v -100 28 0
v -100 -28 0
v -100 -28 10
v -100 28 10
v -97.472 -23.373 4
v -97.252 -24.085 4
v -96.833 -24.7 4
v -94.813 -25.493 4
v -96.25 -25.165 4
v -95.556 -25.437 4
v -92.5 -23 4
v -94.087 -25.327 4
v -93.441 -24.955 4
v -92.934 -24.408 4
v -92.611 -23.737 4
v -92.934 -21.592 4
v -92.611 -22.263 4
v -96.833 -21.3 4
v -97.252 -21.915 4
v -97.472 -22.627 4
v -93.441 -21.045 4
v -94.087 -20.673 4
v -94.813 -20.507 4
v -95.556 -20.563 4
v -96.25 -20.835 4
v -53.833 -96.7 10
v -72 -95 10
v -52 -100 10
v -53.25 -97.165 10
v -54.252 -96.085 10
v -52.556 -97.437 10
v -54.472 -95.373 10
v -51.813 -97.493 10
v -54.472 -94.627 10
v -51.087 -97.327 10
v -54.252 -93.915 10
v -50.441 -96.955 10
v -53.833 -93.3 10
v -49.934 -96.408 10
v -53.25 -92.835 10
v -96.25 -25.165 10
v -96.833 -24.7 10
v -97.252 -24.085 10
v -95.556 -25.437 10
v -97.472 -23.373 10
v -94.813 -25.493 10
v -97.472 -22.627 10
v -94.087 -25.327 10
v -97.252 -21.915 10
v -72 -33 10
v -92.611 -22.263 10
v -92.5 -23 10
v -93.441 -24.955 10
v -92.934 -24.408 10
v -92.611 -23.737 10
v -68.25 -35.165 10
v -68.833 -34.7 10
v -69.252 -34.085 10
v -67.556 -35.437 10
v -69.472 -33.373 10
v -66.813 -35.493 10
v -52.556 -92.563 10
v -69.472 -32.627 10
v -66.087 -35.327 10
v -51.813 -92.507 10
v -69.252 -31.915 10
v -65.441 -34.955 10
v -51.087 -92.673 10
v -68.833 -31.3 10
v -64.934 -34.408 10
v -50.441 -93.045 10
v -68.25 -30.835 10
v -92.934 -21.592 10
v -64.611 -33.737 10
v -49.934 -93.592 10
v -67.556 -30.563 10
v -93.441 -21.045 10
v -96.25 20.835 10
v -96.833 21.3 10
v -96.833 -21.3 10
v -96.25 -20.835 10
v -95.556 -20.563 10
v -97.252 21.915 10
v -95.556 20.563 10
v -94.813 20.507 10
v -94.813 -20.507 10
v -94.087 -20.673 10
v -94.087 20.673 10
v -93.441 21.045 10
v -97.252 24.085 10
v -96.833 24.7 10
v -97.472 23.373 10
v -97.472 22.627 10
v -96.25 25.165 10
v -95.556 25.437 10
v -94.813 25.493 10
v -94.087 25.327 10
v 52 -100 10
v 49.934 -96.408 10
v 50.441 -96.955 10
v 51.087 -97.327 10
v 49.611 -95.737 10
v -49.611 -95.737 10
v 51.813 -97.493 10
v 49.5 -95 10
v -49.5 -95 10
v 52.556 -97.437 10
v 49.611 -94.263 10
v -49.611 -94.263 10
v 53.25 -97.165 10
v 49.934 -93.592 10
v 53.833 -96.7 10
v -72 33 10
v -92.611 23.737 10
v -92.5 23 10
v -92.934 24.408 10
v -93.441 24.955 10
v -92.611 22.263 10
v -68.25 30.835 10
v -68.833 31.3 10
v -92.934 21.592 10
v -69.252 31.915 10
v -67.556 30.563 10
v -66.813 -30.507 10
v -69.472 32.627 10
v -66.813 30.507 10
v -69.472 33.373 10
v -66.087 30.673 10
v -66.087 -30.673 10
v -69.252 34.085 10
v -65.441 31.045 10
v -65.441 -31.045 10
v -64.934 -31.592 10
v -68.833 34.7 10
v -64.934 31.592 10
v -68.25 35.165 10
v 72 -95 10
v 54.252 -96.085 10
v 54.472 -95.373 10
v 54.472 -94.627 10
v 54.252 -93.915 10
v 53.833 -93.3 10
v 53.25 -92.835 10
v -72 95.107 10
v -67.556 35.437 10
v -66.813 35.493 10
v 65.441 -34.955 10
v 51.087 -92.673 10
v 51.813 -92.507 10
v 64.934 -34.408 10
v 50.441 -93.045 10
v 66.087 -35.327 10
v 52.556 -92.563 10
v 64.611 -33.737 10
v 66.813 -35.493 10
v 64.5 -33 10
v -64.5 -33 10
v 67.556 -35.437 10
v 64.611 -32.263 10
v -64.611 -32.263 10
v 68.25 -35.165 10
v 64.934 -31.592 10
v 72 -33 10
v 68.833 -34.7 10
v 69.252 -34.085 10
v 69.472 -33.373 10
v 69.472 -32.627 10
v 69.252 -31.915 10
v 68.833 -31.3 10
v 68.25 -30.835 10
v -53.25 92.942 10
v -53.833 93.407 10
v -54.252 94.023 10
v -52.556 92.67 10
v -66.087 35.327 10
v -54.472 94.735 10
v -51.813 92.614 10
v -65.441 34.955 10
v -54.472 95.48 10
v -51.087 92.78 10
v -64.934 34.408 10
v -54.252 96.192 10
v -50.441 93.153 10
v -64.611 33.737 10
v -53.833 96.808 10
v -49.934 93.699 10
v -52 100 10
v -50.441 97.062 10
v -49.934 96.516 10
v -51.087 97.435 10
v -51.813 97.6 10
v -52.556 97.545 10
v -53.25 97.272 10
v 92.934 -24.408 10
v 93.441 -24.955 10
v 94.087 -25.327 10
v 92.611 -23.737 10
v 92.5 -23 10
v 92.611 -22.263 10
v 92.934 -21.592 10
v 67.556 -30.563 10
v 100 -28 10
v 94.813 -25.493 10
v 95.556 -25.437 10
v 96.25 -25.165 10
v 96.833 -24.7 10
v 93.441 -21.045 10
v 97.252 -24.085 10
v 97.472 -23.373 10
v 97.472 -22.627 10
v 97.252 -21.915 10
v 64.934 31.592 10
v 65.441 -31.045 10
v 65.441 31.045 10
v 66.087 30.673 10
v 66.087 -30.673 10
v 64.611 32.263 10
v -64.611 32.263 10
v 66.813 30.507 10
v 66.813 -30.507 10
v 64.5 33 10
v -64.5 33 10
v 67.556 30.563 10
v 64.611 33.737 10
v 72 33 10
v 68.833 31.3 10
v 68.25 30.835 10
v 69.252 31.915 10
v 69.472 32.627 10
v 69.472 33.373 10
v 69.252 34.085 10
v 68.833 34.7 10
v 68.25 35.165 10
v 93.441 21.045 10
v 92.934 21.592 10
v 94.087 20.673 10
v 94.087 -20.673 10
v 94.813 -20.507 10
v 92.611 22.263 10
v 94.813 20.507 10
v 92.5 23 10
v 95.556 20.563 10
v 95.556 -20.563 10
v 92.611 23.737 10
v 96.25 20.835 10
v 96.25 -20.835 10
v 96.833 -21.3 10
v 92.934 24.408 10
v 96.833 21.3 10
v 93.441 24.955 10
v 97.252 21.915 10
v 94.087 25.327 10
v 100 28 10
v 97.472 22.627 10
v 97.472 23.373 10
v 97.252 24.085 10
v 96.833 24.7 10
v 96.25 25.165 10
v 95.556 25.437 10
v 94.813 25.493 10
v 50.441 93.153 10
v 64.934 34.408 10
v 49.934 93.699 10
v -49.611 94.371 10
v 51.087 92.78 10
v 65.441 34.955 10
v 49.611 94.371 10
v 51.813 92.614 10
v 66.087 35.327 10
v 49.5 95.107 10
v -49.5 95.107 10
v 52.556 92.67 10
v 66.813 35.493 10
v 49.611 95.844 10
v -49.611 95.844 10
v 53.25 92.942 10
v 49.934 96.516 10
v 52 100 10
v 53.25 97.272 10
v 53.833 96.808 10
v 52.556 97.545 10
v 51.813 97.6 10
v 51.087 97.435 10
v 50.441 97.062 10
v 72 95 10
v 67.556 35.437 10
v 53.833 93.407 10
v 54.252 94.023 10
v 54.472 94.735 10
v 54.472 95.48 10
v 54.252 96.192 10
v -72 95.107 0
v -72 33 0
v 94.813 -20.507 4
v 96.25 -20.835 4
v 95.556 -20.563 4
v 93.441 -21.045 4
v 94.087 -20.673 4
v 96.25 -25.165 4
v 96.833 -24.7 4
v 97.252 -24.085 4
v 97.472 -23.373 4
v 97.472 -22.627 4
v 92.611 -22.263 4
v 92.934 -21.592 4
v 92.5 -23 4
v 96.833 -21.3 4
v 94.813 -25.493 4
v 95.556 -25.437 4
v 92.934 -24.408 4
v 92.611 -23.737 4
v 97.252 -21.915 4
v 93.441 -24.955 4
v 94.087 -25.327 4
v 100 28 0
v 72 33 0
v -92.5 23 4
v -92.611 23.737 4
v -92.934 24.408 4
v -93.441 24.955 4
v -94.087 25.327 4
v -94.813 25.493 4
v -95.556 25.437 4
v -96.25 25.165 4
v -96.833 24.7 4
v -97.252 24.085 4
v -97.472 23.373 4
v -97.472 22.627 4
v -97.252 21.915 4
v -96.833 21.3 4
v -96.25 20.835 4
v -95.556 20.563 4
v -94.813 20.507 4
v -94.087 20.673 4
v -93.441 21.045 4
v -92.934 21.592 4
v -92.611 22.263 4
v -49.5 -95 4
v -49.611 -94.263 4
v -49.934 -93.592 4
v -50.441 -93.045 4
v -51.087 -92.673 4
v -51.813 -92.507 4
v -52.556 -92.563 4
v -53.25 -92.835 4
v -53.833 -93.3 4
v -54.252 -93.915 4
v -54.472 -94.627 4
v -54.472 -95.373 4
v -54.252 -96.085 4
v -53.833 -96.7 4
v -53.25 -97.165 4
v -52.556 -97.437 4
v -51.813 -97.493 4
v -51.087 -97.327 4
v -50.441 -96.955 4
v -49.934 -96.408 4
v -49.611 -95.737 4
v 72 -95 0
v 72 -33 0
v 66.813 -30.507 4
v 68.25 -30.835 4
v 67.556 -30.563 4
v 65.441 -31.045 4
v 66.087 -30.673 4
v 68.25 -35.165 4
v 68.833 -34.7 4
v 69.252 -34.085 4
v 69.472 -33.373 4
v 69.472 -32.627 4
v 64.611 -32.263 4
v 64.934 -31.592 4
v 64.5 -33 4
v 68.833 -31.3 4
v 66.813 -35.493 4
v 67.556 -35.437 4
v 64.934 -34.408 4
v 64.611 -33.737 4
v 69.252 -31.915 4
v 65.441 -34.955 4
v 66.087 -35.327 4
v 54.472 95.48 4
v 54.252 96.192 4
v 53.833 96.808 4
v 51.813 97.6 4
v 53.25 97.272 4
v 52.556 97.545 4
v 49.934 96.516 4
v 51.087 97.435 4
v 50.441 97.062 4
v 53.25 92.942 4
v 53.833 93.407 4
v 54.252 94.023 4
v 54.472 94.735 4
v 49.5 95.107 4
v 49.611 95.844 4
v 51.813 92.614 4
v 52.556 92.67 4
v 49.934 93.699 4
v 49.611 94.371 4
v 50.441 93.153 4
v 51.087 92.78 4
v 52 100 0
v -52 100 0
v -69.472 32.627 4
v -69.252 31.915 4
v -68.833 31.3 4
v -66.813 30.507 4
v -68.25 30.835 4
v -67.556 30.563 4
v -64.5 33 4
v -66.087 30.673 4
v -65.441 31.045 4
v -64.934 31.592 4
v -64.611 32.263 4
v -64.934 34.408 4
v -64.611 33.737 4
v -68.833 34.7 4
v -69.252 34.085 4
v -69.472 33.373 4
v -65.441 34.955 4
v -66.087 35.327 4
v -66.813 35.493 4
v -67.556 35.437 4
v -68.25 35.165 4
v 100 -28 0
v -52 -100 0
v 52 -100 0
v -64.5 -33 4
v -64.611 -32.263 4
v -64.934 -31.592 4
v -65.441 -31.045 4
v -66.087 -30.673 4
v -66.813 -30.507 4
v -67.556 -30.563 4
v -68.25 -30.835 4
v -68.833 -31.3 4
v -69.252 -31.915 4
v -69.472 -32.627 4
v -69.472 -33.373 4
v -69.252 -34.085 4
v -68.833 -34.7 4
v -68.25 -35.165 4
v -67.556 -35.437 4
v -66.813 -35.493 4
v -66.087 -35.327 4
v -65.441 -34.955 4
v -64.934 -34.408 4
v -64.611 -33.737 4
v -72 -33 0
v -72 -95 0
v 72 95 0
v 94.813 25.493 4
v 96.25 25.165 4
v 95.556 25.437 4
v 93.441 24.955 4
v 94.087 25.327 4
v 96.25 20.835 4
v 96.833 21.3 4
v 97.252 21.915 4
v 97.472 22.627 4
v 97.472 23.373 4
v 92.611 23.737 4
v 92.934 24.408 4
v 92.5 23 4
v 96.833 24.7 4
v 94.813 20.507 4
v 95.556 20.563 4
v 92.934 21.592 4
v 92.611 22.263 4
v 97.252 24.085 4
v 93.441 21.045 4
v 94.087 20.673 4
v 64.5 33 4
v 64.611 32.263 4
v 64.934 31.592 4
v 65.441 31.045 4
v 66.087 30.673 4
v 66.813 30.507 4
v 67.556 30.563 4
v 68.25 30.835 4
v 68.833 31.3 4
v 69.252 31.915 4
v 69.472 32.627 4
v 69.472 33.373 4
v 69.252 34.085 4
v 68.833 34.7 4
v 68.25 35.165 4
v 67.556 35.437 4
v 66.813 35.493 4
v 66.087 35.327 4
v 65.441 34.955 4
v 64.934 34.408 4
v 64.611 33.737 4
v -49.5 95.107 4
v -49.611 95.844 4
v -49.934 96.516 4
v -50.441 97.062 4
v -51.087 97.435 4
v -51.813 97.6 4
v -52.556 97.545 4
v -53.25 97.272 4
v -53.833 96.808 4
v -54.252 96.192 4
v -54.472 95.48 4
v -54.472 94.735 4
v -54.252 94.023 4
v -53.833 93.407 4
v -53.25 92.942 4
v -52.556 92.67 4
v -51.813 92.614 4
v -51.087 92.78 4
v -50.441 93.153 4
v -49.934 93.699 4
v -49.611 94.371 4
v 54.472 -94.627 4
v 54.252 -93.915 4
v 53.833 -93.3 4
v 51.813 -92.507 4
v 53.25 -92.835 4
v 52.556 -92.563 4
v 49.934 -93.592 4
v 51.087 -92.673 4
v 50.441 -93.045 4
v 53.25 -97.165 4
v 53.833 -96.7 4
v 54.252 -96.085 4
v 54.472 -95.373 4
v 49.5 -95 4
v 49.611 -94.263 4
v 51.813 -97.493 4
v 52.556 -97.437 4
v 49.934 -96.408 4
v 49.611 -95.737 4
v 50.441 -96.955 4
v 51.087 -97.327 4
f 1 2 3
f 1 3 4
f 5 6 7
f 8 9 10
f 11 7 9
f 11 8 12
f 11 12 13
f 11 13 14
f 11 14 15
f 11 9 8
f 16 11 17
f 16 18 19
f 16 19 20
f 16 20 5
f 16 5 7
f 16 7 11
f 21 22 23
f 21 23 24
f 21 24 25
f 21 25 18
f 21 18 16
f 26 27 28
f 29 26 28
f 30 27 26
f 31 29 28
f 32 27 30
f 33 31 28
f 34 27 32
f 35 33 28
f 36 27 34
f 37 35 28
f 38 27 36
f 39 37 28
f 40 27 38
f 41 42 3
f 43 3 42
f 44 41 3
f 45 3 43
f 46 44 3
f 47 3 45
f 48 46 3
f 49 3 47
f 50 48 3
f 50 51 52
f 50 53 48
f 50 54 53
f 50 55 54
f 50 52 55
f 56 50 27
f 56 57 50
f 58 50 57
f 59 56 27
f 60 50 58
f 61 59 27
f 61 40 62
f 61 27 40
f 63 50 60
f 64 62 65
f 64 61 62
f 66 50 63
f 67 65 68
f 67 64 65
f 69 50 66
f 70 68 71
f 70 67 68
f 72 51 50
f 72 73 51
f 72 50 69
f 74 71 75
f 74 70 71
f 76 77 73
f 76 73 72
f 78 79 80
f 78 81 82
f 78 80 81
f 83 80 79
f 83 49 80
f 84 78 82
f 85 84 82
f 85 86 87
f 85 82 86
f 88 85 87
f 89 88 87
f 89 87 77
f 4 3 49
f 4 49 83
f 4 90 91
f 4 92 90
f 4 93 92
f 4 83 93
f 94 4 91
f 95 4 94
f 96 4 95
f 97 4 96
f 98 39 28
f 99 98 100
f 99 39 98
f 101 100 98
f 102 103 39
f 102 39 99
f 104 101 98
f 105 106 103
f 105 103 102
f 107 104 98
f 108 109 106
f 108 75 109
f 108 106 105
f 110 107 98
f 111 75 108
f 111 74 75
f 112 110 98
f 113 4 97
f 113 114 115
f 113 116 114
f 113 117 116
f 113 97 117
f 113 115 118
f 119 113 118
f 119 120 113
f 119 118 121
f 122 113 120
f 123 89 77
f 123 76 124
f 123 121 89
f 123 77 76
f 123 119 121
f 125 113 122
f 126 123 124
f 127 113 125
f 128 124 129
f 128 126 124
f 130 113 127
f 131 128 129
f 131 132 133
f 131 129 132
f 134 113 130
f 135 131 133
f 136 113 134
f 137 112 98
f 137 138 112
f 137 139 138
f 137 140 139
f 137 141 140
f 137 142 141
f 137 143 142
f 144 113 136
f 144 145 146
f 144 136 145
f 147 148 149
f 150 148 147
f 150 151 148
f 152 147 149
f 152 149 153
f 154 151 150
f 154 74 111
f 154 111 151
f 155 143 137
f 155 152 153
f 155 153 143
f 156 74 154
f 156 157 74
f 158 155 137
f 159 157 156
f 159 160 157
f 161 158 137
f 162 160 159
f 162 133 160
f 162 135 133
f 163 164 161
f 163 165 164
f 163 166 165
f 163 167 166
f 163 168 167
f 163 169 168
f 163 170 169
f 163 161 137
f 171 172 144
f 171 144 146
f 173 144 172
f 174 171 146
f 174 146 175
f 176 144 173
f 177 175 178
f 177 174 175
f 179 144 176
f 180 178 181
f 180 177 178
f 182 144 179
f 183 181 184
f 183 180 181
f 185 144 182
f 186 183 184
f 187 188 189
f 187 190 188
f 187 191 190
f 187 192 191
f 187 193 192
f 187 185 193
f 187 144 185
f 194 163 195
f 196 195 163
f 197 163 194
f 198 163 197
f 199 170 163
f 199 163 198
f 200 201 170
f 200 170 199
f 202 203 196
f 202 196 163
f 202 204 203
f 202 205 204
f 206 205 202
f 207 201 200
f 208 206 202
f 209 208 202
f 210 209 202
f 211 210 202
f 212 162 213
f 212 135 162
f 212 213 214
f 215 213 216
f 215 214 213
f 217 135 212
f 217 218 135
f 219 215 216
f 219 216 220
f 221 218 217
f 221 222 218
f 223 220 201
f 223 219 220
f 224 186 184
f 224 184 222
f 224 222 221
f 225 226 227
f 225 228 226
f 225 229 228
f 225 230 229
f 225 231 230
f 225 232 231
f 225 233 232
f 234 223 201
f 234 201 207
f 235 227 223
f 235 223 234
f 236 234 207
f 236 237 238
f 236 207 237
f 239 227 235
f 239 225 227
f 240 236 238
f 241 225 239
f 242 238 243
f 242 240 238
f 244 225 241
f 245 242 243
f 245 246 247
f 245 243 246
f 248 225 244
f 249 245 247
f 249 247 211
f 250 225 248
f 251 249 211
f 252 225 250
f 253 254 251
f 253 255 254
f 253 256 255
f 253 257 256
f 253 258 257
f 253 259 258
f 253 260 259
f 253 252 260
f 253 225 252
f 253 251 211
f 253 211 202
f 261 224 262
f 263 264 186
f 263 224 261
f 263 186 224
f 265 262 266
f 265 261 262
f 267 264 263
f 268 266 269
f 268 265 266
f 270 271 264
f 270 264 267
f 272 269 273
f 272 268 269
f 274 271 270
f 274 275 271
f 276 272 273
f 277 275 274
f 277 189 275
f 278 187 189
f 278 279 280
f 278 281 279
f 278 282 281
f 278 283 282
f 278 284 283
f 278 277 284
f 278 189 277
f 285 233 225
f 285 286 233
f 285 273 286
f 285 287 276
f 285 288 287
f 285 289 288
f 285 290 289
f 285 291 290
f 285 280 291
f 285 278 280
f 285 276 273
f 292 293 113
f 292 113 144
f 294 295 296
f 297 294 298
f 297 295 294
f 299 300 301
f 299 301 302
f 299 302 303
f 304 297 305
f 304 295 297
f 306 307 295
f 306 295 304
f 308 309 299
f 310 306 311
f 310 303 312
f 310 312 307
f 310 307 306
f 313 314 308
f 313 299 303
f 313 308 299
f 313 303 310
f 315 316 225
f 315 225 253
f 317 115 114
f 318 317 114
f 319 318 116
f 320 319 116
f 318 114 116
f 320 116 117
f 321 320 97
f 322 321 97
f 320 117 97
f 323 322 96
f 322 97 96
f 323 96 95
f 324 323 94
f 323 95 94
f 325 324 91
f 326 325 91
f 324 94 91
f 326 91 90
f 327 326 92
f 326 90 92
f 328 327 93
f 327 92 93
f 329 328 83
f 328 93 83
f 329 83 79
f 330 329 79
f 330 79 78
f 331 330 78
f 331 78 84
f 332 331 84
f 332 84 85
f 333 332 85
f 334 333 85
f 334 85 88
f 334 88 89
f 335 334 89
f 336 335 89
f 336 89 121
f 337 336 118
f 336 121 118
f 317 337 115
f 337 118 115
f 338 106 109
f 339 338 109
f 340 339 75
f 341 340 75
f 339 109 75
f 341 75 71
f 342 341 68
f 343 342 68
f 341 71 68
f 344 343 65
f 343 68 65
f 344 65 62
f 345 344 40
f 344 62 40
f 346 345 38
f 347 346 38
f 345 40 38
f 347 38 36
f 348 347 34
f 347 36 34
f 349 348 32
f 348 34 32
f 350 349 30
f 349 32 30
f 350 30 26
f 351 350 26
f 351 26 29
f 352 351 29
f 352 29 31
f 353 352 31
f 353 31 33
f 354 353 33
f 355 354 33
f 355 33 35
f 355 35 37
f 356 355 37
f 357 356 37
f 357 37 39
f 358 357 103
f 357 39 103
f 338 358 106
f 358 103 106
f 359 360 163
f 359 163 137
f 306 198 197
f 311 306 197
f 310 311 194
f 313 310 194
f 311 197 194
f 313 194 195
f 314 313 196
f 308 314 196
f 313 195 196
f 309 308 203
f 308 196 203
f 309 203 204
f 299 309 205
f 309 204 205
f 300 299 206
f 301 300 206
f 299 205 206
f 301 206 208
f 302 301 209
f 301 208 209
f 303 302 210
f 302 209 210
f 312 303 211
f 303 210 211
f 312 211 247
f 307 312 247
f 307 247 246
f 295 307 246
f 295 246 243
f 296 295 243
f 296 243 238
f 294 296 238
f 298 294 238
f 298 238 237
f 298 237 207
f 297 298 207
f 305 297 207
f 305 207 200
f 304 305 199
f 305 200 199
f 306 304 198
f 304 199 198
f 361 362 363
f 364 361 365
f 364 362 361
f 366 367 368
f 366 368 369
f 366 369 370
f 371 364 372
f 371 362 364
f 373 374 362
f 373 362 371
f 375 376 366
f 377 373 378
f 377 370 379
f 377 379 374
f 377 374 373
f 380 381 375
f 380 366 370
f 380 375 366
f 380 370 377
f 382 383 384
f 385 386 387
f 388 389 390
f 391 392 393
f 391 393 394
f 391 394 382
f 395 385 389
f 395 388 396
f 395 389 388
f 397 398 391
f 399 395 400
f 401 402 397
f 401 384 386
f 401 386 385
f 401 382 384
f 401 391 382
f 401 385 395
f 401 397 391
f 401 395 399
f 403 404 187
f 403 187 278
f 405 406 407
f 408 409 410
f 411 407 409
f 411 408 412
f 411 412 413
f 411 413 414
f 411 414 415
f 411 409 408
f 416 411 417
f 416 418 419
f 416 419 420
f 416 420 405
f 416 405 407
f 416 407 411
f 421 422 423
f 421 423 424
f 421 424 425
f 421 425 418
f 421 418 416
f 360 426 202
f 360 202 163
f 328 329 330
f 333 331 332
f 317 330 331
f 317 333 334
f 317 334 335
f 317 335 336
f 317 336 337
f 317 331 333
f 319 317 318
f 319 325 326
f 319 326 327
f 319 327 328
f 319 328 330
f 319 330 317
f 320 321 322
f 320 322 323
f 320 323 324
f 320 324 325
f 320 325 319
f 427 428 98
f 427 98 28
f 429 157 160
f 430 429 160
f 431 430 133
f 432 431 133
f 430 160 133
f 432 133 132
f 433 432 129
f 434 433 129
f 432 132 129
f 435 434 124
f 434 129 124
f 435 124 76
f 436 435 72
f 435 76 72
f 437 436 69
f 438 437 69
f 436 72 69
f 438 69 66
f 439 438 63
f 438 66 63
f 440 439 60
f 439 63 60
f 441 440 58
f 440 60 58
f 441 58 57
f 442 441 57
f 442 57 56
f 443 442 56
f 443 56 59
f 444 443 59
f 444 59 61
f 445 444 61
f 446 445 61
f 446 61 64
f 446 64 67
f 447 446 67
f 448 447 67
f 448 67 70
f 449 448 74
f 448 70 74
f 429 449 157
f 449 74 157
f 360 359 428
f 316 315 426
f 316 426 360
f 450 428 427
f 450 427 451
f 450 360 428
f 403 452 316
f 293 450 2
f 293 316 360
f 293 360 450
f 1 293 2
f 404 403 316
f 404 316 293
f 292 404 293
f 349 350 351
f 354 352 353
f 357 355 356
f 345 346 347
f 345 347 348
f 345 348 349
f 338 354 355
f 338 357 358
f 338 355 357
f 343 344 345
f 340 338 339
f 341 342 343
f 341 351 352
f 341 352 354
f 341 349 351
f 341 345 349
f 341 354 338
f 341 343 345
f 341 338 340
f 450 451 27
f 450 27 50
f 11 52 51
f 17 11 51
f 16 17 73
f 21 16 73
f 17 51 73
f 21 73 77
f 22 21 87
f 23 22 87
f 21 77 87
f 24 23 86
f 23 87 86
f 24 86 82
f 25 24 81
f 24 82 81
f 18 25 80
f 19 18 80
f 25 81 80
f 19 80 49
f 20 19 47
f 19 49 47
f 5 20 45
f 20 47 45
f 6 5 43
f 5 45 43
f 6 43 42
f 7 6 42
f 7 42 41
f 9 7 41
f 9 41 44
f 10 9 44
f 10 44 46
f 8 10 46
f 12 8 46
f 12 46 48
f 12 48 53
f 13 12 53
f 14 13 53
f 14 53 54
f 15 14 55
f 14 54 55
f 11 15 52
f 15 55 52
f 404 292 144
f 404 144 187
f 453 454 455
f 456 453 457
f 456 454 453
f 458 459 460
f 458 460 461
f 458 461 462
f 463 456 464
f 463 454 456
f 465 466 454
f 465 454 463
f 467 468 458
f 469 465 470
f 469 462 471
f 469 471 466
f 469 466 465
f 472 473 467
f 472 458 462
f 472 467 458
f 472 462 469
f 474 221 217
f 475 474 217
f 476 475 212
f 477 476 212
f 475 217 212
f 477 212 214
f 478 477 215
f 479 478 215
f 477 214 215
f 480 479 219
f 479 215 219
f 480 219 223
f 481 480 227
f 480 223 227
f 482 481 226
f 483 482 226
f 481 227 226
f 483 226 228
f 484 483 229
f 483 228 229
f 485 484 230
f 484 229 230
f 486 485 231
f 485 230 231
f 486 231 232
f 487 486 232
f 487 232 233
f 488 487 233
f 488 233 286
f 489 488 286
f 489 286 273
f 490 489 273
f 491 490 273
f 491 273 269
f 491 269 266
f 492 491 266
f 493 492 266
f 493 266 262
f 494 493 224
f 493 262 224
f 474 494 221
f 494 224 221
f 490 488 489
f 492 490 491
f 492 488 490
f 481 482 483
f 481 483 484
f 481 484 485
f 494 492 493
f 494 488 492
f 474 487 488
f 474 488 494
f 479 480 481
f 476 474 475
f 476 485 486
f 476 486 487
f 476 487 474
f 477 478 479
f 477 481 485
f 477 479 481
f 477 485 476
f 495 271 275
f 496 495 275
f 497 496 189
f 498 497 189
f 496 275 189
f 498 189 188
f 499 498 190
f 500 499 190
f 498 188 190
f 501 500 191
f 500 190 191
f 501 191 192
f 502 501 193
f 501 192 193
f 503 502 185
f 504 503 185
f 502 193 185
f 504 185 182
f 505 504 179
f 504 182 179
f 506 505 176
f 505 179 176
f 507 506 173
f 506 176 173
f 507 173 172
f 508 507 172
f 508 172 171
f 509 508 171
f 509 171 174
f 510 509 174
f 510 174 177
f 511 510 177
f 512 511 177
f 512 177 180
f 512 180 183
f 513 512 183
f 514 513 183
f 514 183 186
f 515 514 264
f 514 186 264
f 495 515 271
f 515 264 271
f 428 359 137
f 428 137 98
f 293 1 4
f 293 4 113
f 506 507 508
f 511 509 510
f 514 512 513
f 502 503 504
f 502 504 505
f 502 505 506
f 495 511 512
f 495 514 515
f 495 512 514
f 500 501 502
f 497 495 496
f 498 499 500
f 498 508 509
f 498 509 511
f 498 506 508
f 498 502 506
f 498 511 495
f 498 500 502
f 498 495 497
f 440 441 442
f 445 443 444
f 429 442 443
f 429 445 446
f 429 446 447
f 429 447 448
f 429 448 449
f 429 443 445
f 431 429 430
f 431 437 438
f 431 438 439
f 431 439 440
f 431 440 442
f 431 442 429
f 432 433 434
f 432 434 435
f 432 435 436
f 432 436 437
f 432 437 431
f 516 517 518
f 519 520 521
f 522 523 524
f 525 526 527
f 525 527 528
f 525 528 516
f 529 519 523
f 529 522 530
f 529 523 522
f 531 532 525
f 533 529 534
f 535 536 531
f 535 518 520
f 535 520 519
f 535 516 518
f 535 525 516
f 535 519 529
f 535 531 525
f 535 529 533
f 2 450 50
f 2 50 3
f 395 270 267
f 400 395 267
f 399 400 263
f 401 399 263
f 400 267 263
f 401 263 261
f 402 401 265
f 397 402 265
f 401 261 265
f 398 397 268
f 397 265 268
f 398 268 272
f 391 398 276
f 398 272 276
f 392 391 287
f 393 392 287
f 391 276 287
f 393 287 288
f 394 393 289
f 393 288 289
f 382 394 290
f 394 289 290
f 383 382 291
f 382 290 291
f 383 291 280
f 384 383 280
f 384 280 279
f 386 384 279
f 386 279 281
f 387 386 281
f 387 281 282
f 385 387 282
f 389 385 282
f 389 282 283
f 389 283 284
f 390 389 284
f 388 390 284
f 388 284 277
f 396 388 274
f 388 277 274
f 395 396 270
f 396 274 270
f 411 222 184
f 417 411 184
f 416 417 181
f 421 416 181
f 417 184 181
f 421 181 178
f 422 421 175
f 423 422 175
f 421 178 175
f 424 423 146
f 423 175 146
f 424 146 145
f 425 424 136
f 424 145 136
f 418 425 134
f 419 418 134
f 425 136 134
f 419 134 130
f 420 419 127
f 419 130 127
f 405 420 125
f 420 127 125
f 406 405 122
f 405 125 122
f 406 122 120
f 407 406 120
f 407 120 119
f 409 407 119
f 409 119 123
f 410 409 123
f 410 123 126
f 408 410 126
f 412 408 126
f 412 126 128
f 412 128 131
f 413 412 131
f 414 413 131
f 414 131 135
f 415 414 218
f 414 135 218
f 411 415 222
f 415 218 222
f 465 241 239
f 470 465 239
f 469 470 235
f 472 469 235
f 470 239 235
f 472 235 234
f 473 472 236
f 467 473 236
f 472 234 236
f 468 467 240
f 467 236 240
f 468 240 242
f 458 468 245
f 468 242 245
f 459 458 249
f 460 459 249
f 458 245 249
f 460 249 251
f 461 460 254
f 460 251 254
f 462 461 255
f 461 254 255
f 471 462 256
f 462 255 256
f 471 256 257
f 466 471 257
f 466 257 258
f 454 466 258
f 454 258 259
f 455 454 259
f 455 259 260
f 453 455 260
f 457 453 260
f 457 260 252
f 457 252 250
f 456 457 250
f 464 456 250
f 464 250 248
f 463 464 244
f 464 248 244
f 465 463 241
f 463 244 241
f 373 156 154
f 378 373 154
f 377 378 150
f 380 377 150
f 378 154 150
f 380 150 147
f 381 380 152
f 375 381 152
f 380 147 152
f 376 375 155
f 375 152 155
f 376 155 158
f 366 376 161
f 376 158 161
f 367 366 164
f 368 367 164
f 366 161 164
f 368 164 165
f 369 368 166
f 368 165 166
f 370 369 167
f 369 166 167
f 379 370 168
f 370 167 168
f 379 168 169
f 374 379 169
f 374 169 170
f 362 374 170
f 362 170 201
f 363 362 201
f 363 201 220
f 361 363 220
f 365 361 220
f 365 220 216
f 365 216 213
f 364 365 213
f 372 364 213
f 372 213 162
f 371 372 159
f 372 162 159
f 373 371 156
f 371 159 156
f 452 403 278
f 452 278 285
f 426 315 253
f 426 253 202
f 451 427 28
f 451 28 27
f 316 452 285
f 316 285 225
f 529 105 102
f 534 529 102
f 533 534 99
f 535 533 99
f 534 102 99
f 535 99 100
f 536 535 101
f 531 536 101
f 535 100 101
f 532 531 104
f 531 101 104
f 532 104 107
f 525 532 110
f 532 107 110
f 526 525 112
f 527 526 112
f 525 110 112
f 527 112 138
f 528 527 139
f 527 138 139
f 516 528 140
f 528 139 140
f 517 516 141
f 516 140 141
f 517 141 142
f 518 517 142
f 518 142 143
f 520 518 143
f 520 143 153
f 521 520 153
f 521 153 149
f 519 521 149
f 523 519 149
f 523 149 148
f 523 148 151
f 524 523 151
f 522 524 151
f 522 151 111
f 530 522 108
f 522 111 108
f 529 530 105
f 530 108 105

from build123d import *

# Parameters (mm, degrees)
BOSS_EXTRUDE2_DEPTH = 15
SKETCH2_W           = 3
SKETCH2_H           = 20
CUT_EXTRUDE2_DEPTH  = 10
SKETCH4_W           = 3
SKETCH4_H           = 20
BOSS_EXTRUDE5_DEPTH = 10
CUT_EXTRUDE3_DEPTH  = 5
SKETCH6_R           = 2.5
CUT_EXTRUDE4_DEPTH  = 6


with BuildPart() as part:
    # Sketch1 → Boss-Extrude2 (new body)
    with BuildSketch(Plane.XY):
        Polygon((-52, 100), (52, 100), (72, 95), (72, 33), (100, 28), (100, -28), (72, -33), (72, -95), (52, -100), (-52, -100), (-72, -95), (-72, -33), (-100, -28), (-100, 28), (-72, 33), (-72, 95.107401563), align=None)
    extrude(amount=BOSS_EXTRUDE2_DEPTH)

    # Sketch2 → Cut-Extrude2 (cut)
    with BuildSketch(Plane.XY.offset(15)):
        with Locations((-69.5, 80.352031484)):
            Rectangle(SKETCH2_W, SKETCH2_H)
        with Locations((-69.5, 43)):
            Rectangle(SKETCH2_W, SKETCH2_H)
    extrude(amount=-CUT_EXTRUDE2_DEPTH, mode=Mode.SUBTRACT)

    # Sketch4 → Boss-Extrude5 (add)
    with BuildSketch(Plane.XY.offset(15)):
        Polygon((-71, 90.352031484), (-68, 90.352031484), (-68, 70.352031484), (-69.5, 70.352031484), (-71, 70.352031484), align=None)
        with Locations((-69.5, 43)):
            Rectangle(SKETCH4_W, SKETCH4_H)
    extrude(amount=-BOSS_EXTRUDE5_DEPTH)

    # Sketch5 → Cut-Extrude3 (cut)
    with BuildSketch(Plane.XY.offset(15)):
        Polygon((-72, 95.107401563), (-72, 33), (-100, 28), (-100, -28), (-72, -33), (-72, -95), (-52, -100), (52, -100), (72, -95), (72, -33), (100, -28), (100, 28), (72, 33), (72, 95), (52, 100), (-52, 100), align=None)
    extrude(amount=-CUT_EXTRUDE3_DEPTH, mode=Mode.SUBTRACT)

    # Sketch6 → Cut-Extrude4 (cut)
    with BuildSketch(Plane.XY.offset(10)):
        with Locations((-52, 95.107401563)):
            Circle(SKETCH6_R)
        with Locations((-52, -95)):
            Circle(SKETCH6_R)
        with Locations((-67, -33)):
            Circle(SKETCH6_R)
        with Locations((-67, 33)):
            Circle(SKETCH6_R)
        with Locations((-95, 23)):
            Circle(SKETCH6_R)
        with Locations((-95, -23)):
            Circle(SKETCH6_R)
        with Locations(Location((95, -23, 0), (0, 0, 180))):
            Circle(SKETCH6_R)
        with Locations(Location((95, 23, 0), (0, 0, 180))):
            Circle(SKETCH6_R)
        with Locations(Location((67, 33, 0), (0, 0, 180))):
            Circle(SKETCH6_R)
        with Locations(Location((67, -33, 0), (0, 0, 180))):
            Circle(SKETCH6_R)
        with Locations(Location((52, -95, 0), (0, 0, 180))):
            Circle(SKETCH6_R)
        with Locations(Location((52, 95.107401563, 0), (0, 0, 180))):
            Circle(SKETCH6_R)
    extrude(amount=-CUT_EXTRUDE4_DEPTH, mode=Mode.SUBTRACT)


solid = part.part
